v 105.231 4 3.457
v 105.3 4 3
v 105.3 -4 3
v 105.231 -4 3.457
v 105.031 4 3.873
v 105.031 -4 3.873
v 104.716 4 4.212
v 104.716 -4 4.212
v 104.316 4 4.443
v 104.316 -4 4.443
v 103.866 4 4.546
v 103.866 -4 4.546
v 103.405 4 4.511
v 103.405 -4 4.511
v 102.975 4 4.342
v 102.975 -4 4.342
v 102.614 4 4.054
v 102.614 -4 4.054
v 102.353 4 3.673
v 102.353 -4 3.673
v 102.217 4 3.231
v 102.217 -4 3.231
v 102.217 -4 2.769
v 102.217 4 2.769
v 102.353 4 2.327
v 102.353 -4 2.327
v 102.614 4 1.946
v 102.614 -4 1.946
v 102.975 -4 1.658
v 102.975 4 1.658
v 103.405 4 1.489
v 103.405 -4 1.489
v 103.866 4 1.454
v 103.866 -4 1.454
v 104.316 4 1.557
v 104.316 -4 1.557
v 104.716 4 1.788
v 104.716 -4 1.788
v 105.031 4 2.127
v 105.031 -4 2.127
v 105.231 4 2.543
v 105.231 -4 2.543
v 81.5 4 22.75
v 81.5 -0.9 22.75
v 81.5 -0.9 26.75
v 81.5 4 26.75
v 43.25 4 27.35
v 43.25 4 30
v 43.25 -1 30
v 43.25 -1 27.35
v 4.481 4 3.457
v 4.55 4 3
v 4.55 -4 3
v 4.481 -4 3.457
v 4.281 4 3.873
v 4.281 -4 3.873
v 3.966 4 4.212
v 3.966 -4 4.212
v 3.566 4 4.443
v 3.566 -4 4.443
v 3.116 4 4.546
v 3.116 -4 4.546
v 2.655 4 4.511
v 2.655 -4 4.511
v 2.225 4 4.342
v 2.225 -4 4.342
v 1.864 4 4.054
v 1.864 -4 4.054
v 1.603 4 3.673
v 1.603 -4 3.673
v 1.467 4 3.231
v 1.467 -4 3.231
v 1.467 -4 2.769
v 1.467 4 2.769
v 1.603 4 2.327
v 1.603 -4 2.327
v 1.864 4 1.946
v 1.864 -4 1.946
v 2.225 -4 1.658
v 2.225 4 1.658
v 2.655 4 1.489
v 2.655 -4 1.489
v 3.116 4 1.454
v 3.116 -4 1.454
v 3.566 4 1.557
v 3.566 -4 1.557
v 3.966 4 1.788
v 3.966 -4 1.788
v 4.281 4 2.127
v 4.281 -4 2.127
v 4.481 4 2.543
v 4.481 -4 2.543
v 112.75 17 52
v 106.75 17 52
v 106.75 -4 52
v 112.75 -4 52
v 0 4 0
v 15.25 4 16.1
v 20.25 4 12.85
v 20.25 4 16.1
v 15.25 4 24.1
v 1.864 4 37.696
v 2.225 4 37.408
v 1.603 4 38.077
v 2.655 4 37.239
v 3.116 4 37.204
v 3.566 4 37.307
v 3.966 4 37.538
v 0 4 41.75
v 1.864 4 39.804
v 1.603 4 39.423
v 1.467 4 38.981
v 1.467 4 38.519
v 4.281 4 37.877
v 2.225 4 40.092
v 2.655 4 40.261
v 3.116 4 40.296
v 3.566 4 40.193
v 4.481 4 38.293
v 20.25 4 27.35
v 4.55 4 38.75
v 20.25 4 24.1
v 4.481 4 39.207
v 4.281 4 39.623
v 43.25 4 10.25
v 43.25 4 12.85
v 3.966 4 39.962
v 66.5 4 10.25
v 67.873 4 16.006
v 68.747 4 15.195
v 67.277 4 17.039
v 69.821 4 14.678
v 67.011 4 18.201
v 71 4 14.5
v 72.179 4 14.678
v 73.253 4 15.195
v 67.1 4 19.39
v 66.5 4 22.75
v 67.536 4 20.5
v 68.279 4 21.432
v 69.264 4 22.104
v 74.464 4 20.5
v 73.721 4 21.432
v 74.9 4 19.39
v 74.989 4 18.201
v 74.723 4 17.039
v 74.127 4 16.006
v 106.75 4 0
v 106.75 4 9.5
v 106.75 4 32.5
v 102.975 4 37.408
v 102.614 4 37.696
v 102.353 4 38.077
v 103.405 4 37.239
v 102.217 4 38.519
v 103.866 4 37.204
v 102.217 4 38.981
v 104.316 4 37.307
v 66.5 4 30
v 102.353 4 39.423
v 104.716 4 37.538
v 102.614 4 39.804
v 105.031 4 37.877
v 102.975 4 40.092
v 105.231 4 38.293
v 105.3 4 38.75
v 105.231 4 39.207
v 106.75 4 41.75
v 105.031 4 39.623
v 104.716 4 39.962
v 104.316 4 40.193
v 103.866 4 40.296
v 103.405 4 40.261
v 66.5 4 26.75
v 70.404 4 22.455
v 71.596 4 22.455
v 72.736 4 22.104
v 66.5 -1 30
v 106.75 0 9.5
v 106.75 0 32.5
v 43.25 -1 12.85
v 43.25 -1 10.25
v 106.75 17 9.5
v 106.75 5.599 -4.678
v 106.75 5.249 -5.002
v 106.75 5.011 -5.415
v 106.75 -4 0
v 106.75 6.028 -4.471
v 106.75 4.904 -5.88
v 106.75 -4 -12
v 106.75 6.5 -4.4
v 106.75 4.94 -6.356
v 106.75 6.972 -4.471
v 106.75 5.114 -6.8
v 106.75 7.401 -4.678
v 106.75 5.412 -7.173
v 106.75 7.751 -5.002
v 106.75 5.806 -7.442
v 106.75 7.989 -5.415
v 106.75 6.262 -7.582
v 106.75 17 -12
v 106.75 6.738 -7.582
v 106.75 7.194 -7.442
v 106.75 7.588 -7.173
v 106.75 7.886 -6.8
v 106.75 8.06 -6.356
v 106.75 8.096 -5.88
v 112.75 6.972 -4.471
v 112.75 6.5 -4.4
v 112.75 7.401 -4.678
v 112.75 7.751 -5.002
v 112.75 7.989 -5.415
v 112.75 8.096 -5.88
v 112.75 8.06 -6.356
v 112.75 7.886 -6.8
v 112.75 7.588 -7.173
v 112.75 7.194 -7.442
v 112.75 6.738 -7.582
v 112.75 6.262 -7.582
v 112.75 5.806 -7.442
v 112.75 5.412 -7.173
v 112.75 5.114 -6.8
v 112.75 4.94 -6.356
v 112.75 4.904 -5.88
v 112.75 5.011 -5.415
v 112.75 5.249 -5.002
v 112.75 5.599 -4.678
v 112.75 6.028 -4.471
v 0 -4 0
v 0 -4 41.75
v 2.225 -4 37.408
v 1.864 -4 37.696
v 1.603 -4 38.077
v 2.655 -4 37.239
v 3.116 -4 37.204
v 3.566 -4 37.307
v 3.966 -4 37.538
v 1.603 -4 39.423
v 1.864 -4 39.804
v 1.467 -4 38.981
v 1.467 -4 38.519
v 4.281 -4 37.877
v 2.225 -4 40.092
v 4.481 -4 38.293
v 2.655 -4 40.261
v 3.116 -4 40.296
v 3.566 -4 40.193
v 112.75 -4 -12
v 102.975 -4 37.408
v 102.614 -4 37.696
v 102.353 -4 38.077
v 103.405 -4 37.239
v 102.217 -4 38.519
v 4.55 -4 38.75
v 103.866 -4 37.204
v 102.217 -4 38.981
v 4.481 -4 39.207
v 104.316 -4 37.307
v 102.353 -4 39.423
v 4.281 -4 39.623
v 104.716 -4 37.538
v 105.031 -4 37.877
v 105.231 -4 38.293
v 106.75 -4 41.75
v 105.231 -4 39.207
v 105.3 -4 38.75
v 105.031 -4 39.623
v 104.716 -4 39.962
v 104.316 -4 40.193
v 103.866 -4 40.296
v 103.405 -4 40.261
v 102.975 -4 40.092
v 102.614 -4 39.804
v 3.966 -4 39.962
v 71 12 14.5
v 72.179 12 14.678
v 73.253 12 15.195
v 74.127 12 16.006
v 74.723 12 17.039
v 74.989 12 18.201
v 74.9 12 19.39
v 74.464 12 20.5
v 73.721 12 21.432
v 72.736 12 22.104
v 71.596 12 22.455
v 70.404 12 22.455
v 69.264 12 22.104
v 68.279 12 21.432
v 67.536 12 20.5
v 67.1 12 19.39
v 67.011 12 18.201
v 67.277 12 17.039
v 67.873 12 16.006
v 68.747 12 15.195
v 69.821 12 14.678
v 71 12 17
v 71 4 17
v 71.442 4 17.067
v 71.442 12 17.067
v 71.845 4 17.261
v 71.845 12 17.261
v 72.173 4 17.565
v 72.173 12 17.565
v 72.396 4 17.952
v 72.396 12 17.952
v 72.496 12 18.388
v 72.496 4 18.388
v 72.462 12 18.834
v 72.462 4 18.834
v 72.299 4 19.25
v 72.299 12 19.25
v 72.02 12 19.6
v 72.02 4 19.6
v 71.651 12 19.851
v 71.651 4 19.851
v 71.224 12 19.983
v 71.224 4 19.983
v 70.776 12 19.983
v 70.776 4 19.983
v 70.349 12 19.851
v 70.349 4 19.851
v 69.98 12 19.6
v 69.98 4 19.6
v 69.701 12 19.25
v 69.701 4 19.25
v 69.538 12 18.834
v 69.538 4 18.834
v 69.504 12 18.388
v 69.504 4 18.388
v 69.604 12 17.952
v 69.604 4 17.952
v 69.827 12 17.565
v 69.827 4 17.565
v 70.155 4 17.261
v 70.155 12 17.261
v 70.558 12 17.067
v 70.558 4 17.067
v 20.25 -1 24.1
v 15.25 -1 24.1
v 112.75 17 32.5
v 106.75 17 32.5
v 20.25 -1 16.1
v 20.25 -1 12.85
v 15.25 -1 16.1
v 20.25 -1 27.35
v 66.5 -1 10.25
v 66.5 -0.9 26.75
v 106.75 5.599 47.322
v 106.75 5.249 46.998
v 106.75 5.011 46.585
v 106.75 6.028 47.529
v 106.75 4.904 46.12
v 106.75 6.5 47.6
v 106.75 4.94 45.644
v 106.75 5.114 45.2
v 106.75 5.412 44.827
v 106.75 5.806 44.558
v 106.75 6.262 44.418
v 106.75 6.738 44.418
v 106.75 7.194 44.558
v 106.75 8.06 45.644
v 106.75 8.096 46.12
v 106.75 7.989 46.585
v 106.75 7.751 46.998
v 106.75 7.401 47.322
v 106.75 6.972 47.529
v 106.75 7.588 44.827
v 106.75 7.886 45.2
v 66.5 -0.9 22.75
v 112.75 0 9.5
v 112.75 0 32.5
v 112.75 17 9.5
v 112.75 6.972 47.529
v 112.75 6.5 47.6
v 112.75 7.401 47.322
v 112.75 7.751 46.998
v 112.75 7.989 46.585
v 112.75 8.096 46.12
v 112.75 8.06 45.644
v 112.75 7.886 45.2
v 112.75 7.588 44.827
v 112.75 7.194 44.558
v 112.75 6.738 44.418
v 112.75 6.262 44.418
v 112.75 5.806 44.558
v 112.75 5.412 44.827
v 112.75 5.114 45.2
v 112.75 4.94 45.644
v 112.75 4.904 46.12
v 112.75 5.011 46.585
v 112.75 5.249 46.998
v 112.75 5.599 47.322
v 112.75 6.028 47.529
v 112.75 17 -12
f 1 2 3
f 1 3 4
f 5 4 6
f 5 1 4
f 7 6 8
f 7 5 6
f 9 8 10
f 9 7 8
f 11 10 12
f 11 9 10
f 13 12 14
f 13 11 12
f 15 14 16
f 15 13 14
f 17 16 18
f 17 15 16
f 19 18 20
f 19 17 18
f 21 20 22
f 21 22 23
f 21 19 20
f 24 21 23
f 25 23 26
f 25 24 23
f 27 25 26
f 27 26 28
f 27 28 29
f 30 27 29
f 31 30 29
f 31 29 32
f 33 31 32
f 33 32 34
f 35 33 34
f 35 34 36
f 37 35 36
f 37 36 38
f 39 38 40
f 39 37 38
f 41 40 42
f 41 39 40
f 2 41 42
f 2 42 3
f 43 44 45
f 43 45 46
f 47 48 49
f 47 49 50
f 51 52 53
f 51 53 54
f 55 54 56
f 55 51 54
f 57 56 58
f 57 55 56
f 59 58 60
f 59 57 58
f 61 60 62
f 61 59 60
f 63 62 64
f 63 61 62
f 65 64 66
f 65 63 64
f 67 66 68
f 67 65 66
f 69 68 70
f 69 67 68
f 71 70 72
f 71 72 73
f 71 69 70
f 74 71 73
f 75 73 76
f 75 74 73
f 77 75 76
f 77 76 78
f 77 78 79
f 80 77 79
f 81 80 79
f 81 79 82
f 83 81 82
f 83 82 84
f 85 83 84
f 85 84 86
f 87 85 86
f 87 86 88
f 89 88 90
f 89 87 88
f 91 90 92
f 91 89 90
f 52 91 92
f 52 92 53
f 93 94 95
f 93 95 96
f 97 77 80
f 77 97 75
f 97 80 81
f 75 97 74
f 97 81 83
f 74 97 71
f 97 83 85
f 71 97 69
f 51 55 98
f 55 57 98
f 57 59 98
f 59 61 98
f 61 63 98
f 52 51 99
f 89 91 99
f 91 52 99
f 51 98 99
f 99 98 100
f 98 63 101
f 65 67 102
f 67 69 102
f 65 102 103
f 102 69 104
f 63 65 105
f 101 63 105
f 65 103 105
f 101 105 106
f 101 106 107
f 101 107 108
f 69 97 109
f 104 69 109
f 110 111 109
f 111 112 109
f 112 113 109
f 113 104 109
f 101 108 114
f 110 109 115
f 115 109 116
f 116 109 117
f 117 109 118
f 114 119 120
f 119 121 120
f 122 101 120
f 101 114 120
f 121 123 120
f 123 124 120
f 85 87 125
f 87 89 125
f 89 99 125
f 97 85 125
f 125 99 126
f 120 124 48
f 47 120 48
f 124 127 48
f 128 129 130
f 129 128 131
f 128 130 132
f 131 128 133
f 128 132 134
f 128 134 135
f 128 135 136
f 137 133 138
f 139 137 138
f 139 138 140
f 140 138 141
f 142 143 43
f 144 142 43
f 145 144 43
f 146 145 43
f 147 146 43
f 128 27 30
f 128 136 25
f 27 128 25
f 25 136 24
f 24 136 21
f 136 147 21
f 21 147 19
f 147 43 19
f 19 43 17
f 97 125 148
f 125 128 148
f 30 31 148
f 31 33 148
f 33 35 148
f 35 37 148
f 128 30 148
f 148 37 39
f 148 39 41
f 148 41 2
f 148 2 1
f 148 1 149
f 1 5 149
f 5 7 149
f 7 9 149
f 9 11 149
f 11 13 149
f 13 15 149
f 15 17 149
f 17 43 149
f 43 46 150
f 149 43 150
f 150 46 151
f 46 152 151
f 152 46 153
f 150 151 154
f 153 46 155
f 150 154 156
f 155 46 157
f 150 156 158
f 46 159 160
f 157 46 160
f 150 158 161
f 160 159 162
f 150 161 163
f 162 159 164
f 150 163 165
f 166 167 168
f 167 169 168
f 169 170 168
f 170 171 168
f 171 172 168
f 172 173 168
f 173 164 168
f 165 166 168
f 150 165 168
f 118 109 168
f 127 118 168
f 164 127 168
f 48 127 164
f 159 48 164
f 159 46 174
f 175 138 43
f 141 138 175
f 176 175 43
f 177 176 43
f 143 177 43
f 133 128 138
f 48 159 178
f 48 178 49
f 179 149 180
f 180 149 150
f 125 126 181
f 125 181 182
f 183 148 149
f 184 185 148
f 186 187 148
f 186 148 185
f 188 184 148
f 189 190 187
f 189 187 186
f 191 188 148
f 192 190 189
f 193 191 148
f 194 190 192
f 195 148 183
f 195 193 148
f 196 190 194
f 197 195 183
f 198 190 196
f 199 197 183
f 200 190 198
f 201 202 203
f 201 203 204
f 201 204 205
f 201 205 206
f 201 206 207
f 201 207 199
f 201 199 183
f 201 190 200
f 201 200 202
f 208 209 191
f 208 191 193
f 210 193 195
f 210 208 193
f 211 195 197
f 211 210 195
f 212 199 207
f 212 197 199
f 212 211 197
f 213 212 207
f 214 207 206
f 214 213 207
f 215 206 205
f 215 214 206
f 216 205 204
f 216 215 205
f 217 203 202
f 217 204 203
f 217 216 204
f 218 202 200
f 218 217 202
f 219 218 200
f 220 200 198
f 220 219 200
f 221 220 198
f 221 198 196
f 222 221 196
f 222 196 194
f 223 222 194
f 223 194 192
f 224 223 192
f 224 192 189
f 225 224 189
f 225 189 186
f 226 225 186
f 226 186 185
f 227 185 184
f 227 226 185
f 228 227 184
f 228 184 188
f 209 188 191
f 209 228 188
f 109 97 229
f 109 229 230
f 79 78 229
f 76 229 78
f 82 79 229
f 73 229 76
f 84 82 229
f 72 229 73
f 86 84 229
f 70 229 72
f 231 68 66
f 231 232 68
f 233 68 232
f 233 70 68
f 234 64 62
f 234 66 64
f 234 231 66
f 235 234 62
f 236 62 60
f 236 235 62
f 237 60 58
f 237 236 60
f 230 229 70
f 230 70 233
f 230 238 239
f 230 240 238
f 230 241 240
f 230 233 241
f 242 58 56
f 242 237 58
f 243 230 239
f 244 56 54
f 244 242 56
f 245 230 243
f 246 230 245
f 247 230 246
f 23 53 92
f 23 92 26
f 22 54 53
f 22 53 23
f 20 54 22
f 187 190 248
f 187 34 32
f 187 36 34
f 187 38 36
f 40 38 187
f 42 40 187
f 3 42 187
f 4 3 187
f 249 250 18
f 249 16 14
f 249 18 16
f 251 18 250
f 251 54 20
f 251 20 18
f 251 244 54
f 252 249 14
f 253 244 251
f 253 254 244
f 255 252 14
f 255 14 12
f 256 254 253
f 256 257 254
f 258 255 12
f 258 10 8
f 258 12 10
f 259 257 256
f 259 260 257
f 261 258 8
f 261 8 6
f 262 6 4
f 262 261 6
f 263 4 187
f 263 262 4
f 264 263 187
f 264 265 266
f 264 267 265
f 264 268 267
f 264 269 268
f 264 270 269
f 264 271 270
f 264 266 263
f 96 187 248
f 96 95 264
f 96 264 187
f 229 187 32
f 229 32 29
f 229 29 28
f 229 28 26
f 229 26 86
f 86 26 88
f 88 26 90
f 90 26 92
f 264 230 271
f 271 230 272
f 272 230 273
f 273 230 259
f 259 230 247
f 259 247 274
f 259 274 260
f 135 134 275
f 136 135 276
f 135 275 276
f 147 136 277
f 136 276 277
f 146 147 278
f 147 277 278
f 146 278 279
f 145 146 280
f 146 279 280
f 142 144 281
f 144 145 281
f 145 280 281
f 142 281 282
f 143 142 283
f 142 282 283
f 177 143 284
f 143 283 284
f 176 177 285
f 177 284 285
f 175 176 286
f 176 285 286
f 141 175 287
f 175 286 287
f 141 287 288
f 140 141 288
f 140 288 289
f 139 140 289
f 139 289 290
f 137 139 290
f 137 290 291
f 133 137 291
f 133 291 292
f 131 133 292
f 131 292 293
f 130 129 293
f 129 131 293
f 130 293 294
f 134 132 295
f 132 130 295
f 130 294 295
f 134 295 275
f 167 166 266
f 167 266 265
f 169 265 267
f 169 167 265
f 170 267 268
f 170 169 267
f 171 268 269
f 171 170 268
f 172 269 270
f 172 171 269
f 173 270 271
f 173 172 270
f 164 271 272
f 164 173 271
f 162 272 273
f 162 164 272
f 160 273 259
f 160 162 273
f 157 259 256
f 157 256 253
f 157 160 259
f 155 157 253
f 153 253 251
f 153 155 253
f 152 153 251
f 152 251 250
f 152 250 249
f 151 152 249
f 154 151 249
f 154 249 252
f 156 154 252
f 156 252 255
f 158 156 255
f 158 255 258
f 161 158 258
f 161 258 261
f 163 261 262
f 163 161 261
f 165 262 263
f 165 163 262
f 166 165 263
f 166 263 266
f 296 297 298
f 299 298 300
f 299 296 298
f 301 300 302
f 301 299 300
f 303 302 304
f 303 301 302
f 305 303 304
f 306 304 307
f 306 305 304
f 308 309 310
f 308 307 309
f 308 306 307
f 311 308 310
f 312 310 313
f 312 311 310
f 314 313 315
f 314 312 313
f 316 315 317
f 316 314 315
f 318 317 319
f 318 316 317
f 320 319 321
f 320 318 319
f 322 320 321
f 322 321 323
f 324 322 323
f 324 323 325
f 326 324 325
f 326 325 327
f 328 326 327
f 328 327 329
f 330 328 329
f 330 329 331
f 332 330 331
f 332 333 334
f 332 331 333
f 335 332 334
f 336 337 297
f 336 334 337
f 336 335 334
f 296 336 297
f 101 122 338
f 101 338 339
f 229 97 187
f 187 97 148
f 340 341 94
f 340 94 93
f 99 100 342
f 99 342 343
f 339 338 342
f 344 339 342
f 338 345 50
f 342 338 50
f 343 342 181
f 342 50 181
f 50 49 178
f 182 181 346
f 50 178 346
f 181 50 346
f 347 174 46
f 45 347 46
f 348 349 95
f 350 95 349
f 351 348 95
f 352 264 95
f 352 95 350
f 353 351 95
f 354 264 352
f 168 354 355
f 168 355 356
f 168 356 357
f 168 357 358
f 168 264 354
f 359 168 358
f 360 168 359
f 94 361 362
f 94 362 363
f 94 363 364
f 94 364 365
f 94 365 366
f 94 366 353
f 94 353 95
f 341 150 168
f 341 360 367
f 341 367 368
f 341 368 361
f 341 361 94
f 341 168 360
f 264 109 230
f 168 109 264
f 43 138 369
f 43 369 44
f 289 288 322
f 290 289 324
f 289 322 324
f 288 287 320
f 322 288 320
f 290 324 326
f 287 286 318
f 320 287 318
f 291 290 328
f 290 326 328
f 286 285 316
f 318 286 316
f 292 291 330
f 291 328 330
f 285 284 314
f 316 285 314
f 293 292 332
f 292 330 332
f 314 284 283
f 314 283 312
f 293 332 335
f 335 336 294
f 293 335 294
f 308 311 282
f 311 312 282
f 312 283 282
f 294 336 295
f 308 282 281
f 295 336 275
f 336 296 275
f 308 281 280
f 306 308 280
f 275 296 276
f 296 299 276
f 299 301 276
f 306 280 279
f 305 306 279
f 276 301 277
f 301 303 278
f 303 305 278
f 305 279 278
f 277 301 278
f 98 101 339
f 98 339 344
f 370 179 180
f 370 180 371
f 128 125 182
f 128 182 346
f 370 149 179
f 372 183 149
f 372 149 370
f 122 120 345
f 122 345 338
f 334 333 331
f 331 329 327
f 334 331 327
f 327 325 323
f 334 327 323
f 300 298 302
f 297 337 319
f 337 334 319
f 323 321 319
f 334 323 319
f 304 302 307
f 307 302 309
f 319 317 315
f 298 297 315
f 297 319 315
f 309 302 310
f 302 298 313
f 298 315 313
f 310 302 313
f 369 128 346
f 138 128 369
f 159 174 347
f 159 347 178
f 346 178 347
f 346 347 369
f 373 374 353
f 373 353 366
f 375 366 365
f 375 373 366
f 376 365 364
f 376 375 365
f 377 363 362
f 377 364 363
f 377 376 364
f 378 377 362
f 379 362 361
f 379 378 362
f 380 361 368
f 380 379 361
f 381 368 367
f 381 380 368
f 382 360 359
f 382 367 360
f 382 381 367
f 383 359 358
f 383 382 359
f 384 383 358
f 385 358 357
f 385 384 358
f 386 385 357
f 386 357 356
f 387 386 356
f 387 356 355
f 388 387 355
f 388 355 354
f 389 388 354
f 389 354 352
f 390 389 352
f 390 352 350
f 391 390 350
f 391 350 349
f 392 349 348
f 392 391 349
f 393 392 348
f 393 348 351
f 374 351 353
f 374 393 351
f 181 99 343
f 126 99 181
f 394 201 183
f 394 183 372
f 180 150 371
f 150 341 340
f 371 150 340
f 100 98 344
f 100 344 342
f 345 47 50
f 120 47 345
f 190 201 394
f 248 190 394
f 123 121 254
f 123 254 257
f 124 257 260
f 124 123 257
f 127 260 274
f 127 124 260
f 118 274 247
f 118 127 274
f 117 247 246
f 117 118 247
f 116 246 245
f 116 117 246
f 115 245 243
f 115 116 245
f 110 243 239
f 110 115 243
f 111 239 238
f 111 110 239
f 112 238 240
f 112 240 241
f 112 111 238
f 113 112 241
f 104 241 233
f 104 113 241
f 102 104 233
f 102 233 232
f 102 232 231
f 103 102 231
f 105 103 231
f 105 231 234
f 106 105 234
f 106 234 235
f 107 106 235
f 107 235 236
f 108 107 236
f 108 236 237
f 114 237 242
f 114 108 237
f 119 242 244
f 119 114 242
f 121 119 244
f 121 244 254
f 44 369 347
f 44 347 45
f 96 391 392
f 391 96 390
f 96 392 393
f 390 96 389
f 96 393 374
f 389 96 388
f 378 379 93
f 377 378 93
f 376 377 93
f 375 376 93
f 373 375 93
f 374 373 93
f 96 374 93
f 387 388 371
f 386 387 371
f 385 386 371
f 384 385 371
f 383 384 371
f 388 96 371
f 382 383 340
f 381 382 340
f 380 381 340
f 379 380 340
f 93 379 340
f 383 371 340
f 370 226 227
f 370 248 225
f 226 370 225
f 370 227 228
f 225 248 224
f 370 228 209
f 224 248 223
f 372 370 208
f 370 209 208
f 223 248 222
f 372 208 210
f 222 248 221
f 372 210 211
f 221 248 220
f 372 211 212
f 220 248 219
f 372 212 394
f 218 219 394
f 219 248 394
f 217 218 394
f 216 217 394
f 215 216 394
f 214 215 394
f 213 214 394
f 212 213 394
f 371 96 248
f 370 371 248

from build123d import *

# Parameters (mm, degrees)
BOX059_W                   = 15
BOX059_H                   = 6
BOX059_DEPTH               = 4
EXTRUDE027_DEPTH           = 5
EXTRUDE027_ROLL_ANGLE      = -90
EXTRUDE027_PLACEMENT_ANGLE = -90
CYLINDER053_R              = 1.6
CYLINDER053_DEPTH          = 10
CYLINDER052_R              = 1.6
CYLINDER052_DEPTH          = 10
SKETCH024_W                = 106.75
SKETCH024_H                = 41.75
SKETCH024_R                = 1.55
EXTRUDE024_DEPTH           = 8
EXTRUDE024_PLACEMENT_ANGLE = 270
BOX058_W                   = 6
BOX058_H                   = 17
BOX058_DEPTH               = 23
BOX056_W                   = 6
BOX056_H                   = 21
BOX056_DEPTH               = 64
TUBE003_R                  = 4
TUBE003_R_2                = 1.5
TUBE003_DEPTH              = 12


with BuildPart() as cube034:
    # Box059 → Box059 (new body)
    with BuildSketch(Plane(origin=(66.5, -0.9, 22.75), x_dir=(1, 0, 0), z_dir=(0, 0, 1))):
        with Locations((7.5, 3)):
            Rectangle(BOX059_W, BOX059_H)
    extrude(amount=BOX059_DEPTH)


with BuildPart() as extrude027:
    # Sketch028 → Extrude027 (new body)
    with BuildSketch(Plane.YZ):
        Polygon((10.25, 66.5), (10.25, 43.25), (12.9, 43.25), (12.9, 20.25), (16.15, 20.25), (16.15, 15.25), (24.15, 15.25), (24.15, 20.25), (27.4, 20.25), (27.4, 43.25), (30, 43.25), (30, 66.5), align=None)
    extrude(amount=EXTRUDE027_DEPTH)


with BuildPart() as extrude027_1:
    # Extrude027 roll: moved
    add(extrude027.part.rotate(Axis((0, 0, 0), (1, 0, 0)), EXTRUDE027_ROLL_ANGLE))


with BuildPart() as extrude027_2:
    # Extrude027 placement: moved
    add(extrude027_1.part.moved(Location((0, 4, 40.25))).rotate(Axis((0, 4, 40.25), (0, 0, 1)), EXTRUDE027_PLACEMENT_ANGLE))


with BuildPart() as cylinder053:
    # Cylinder053 → Cylinder053 (new body)
    with BuildSketch(Plane(origin=(114, 6.5, 46), x_dir=(0, 0, 1), z_dir=(-1, 0, 0))):
        Circle(CYLINDER053_R)
    extrude(amount=CYLINDER053_DEPTH)


with BuildPart() as m3cyl:
    # Cylinder052 → Cylinder052 (new body)
    with BuildSketch(Plane(origin=(114, 6.5, -6), x_dir=(0, 0, 1), z_dir=(-1, 0, 0))):
        Circle(CYLINDER052_R)
    extrude(amount=CYLINDER052_DEPTH)

    # Fusion038: union Cylinder053
    add(cylinder053.part)


with BuildPart() as bottom001:
    # Sketch024 → Extrude024 (new body)
    with BuildSketch(Plane.YZ):
        with Locations((53.375, 20.875)):
            Rectangle(SKETCH024_W, SKETCH024_H)
        with Locations((3, 3)):
            Circle(SKETCH024_R, mode=Mode.SUBTRACT)
        with Locations((3, 38.75)):
            Circle(SKETCH024_R, mode=Mode.SUBTRACT)
        with Locations((103.75, 38.75)):
            Circle(SKETCH024_R, mode=Mode.SUBTRACT)
        with Locations((103.75, 3)):
            Circle(SKETCH024_R, mode=Mode.SUBTRACT)
    extrude(amount=EXTRUDE024_DEPTH)


with BuildPart() as bottom001_1:
    # Extrude024 placement: moved
    add(bottom001.part.moved(Location((0, 4, 0))).rotate(Axis((0, 4, 0), (0, 0, 1)), EXTRUDE024_PLACEMENT_ANGLE))


with BuildPart() as basemount001:
    # Box058 → Box058 (new body)
    with BuildSketch(Plane(origin=(106.75, 0, 9.5), x_dir=(1, 0, 0), z_dir=(0, 0, 1))):
        with Locations((3, 8.5)):
            Rectangle(BOX058_W, BOX058_H)
    extrude(amount=BOX058_DEPTH)


with BuildPart() as lora_cut:
    # Box056 → Box056 (new body)
    with BuildSketch(Plane(origin=(106.75, -4, -12), x_dir=(1, 0, 0), z_dir=(0, 0, 1))):
        with Locations((3, 10.5)):
            Rectangle(BOX056_W, BOX056_H)
    extrude(amount=BOX056_DEPTH)

    # Cut038: cut baseMOunt001
    add(basemount001.part, mode=Mode.SUBTRACT)

    # Fusion037: union Bottom001
    add(bottom001_1.part)

    # Cut039: cut m3Cyl
    add(m3cyl.part, mode=Mode.SUBTRACT)

    # Cut040: cut Extrude027
    add(extrude027_2.part, mode=Mode.SUBTRACT)

    # Cut041: cut Cube034
    add(cube034.part, mode=Mode.SUBTRACT)


with BuildPart() as bottom002:
    # Tube003 → Tube003 (new body)
    with BuildSketch(Plane(origin=(71, 12, 18.5), x_dir=(0, 0, -1), z_dir=(0, -1, 0))):
        Circle(TUBE003_R)
        Circle(TUBE003_R_2, mode=Mode.SUBTRACT)
    extrude(amount=TUBE003_DEPTH)

    # Fusion039: union LoRa_Cut
    add(lora_cut.part)


solid = bottom002.part
